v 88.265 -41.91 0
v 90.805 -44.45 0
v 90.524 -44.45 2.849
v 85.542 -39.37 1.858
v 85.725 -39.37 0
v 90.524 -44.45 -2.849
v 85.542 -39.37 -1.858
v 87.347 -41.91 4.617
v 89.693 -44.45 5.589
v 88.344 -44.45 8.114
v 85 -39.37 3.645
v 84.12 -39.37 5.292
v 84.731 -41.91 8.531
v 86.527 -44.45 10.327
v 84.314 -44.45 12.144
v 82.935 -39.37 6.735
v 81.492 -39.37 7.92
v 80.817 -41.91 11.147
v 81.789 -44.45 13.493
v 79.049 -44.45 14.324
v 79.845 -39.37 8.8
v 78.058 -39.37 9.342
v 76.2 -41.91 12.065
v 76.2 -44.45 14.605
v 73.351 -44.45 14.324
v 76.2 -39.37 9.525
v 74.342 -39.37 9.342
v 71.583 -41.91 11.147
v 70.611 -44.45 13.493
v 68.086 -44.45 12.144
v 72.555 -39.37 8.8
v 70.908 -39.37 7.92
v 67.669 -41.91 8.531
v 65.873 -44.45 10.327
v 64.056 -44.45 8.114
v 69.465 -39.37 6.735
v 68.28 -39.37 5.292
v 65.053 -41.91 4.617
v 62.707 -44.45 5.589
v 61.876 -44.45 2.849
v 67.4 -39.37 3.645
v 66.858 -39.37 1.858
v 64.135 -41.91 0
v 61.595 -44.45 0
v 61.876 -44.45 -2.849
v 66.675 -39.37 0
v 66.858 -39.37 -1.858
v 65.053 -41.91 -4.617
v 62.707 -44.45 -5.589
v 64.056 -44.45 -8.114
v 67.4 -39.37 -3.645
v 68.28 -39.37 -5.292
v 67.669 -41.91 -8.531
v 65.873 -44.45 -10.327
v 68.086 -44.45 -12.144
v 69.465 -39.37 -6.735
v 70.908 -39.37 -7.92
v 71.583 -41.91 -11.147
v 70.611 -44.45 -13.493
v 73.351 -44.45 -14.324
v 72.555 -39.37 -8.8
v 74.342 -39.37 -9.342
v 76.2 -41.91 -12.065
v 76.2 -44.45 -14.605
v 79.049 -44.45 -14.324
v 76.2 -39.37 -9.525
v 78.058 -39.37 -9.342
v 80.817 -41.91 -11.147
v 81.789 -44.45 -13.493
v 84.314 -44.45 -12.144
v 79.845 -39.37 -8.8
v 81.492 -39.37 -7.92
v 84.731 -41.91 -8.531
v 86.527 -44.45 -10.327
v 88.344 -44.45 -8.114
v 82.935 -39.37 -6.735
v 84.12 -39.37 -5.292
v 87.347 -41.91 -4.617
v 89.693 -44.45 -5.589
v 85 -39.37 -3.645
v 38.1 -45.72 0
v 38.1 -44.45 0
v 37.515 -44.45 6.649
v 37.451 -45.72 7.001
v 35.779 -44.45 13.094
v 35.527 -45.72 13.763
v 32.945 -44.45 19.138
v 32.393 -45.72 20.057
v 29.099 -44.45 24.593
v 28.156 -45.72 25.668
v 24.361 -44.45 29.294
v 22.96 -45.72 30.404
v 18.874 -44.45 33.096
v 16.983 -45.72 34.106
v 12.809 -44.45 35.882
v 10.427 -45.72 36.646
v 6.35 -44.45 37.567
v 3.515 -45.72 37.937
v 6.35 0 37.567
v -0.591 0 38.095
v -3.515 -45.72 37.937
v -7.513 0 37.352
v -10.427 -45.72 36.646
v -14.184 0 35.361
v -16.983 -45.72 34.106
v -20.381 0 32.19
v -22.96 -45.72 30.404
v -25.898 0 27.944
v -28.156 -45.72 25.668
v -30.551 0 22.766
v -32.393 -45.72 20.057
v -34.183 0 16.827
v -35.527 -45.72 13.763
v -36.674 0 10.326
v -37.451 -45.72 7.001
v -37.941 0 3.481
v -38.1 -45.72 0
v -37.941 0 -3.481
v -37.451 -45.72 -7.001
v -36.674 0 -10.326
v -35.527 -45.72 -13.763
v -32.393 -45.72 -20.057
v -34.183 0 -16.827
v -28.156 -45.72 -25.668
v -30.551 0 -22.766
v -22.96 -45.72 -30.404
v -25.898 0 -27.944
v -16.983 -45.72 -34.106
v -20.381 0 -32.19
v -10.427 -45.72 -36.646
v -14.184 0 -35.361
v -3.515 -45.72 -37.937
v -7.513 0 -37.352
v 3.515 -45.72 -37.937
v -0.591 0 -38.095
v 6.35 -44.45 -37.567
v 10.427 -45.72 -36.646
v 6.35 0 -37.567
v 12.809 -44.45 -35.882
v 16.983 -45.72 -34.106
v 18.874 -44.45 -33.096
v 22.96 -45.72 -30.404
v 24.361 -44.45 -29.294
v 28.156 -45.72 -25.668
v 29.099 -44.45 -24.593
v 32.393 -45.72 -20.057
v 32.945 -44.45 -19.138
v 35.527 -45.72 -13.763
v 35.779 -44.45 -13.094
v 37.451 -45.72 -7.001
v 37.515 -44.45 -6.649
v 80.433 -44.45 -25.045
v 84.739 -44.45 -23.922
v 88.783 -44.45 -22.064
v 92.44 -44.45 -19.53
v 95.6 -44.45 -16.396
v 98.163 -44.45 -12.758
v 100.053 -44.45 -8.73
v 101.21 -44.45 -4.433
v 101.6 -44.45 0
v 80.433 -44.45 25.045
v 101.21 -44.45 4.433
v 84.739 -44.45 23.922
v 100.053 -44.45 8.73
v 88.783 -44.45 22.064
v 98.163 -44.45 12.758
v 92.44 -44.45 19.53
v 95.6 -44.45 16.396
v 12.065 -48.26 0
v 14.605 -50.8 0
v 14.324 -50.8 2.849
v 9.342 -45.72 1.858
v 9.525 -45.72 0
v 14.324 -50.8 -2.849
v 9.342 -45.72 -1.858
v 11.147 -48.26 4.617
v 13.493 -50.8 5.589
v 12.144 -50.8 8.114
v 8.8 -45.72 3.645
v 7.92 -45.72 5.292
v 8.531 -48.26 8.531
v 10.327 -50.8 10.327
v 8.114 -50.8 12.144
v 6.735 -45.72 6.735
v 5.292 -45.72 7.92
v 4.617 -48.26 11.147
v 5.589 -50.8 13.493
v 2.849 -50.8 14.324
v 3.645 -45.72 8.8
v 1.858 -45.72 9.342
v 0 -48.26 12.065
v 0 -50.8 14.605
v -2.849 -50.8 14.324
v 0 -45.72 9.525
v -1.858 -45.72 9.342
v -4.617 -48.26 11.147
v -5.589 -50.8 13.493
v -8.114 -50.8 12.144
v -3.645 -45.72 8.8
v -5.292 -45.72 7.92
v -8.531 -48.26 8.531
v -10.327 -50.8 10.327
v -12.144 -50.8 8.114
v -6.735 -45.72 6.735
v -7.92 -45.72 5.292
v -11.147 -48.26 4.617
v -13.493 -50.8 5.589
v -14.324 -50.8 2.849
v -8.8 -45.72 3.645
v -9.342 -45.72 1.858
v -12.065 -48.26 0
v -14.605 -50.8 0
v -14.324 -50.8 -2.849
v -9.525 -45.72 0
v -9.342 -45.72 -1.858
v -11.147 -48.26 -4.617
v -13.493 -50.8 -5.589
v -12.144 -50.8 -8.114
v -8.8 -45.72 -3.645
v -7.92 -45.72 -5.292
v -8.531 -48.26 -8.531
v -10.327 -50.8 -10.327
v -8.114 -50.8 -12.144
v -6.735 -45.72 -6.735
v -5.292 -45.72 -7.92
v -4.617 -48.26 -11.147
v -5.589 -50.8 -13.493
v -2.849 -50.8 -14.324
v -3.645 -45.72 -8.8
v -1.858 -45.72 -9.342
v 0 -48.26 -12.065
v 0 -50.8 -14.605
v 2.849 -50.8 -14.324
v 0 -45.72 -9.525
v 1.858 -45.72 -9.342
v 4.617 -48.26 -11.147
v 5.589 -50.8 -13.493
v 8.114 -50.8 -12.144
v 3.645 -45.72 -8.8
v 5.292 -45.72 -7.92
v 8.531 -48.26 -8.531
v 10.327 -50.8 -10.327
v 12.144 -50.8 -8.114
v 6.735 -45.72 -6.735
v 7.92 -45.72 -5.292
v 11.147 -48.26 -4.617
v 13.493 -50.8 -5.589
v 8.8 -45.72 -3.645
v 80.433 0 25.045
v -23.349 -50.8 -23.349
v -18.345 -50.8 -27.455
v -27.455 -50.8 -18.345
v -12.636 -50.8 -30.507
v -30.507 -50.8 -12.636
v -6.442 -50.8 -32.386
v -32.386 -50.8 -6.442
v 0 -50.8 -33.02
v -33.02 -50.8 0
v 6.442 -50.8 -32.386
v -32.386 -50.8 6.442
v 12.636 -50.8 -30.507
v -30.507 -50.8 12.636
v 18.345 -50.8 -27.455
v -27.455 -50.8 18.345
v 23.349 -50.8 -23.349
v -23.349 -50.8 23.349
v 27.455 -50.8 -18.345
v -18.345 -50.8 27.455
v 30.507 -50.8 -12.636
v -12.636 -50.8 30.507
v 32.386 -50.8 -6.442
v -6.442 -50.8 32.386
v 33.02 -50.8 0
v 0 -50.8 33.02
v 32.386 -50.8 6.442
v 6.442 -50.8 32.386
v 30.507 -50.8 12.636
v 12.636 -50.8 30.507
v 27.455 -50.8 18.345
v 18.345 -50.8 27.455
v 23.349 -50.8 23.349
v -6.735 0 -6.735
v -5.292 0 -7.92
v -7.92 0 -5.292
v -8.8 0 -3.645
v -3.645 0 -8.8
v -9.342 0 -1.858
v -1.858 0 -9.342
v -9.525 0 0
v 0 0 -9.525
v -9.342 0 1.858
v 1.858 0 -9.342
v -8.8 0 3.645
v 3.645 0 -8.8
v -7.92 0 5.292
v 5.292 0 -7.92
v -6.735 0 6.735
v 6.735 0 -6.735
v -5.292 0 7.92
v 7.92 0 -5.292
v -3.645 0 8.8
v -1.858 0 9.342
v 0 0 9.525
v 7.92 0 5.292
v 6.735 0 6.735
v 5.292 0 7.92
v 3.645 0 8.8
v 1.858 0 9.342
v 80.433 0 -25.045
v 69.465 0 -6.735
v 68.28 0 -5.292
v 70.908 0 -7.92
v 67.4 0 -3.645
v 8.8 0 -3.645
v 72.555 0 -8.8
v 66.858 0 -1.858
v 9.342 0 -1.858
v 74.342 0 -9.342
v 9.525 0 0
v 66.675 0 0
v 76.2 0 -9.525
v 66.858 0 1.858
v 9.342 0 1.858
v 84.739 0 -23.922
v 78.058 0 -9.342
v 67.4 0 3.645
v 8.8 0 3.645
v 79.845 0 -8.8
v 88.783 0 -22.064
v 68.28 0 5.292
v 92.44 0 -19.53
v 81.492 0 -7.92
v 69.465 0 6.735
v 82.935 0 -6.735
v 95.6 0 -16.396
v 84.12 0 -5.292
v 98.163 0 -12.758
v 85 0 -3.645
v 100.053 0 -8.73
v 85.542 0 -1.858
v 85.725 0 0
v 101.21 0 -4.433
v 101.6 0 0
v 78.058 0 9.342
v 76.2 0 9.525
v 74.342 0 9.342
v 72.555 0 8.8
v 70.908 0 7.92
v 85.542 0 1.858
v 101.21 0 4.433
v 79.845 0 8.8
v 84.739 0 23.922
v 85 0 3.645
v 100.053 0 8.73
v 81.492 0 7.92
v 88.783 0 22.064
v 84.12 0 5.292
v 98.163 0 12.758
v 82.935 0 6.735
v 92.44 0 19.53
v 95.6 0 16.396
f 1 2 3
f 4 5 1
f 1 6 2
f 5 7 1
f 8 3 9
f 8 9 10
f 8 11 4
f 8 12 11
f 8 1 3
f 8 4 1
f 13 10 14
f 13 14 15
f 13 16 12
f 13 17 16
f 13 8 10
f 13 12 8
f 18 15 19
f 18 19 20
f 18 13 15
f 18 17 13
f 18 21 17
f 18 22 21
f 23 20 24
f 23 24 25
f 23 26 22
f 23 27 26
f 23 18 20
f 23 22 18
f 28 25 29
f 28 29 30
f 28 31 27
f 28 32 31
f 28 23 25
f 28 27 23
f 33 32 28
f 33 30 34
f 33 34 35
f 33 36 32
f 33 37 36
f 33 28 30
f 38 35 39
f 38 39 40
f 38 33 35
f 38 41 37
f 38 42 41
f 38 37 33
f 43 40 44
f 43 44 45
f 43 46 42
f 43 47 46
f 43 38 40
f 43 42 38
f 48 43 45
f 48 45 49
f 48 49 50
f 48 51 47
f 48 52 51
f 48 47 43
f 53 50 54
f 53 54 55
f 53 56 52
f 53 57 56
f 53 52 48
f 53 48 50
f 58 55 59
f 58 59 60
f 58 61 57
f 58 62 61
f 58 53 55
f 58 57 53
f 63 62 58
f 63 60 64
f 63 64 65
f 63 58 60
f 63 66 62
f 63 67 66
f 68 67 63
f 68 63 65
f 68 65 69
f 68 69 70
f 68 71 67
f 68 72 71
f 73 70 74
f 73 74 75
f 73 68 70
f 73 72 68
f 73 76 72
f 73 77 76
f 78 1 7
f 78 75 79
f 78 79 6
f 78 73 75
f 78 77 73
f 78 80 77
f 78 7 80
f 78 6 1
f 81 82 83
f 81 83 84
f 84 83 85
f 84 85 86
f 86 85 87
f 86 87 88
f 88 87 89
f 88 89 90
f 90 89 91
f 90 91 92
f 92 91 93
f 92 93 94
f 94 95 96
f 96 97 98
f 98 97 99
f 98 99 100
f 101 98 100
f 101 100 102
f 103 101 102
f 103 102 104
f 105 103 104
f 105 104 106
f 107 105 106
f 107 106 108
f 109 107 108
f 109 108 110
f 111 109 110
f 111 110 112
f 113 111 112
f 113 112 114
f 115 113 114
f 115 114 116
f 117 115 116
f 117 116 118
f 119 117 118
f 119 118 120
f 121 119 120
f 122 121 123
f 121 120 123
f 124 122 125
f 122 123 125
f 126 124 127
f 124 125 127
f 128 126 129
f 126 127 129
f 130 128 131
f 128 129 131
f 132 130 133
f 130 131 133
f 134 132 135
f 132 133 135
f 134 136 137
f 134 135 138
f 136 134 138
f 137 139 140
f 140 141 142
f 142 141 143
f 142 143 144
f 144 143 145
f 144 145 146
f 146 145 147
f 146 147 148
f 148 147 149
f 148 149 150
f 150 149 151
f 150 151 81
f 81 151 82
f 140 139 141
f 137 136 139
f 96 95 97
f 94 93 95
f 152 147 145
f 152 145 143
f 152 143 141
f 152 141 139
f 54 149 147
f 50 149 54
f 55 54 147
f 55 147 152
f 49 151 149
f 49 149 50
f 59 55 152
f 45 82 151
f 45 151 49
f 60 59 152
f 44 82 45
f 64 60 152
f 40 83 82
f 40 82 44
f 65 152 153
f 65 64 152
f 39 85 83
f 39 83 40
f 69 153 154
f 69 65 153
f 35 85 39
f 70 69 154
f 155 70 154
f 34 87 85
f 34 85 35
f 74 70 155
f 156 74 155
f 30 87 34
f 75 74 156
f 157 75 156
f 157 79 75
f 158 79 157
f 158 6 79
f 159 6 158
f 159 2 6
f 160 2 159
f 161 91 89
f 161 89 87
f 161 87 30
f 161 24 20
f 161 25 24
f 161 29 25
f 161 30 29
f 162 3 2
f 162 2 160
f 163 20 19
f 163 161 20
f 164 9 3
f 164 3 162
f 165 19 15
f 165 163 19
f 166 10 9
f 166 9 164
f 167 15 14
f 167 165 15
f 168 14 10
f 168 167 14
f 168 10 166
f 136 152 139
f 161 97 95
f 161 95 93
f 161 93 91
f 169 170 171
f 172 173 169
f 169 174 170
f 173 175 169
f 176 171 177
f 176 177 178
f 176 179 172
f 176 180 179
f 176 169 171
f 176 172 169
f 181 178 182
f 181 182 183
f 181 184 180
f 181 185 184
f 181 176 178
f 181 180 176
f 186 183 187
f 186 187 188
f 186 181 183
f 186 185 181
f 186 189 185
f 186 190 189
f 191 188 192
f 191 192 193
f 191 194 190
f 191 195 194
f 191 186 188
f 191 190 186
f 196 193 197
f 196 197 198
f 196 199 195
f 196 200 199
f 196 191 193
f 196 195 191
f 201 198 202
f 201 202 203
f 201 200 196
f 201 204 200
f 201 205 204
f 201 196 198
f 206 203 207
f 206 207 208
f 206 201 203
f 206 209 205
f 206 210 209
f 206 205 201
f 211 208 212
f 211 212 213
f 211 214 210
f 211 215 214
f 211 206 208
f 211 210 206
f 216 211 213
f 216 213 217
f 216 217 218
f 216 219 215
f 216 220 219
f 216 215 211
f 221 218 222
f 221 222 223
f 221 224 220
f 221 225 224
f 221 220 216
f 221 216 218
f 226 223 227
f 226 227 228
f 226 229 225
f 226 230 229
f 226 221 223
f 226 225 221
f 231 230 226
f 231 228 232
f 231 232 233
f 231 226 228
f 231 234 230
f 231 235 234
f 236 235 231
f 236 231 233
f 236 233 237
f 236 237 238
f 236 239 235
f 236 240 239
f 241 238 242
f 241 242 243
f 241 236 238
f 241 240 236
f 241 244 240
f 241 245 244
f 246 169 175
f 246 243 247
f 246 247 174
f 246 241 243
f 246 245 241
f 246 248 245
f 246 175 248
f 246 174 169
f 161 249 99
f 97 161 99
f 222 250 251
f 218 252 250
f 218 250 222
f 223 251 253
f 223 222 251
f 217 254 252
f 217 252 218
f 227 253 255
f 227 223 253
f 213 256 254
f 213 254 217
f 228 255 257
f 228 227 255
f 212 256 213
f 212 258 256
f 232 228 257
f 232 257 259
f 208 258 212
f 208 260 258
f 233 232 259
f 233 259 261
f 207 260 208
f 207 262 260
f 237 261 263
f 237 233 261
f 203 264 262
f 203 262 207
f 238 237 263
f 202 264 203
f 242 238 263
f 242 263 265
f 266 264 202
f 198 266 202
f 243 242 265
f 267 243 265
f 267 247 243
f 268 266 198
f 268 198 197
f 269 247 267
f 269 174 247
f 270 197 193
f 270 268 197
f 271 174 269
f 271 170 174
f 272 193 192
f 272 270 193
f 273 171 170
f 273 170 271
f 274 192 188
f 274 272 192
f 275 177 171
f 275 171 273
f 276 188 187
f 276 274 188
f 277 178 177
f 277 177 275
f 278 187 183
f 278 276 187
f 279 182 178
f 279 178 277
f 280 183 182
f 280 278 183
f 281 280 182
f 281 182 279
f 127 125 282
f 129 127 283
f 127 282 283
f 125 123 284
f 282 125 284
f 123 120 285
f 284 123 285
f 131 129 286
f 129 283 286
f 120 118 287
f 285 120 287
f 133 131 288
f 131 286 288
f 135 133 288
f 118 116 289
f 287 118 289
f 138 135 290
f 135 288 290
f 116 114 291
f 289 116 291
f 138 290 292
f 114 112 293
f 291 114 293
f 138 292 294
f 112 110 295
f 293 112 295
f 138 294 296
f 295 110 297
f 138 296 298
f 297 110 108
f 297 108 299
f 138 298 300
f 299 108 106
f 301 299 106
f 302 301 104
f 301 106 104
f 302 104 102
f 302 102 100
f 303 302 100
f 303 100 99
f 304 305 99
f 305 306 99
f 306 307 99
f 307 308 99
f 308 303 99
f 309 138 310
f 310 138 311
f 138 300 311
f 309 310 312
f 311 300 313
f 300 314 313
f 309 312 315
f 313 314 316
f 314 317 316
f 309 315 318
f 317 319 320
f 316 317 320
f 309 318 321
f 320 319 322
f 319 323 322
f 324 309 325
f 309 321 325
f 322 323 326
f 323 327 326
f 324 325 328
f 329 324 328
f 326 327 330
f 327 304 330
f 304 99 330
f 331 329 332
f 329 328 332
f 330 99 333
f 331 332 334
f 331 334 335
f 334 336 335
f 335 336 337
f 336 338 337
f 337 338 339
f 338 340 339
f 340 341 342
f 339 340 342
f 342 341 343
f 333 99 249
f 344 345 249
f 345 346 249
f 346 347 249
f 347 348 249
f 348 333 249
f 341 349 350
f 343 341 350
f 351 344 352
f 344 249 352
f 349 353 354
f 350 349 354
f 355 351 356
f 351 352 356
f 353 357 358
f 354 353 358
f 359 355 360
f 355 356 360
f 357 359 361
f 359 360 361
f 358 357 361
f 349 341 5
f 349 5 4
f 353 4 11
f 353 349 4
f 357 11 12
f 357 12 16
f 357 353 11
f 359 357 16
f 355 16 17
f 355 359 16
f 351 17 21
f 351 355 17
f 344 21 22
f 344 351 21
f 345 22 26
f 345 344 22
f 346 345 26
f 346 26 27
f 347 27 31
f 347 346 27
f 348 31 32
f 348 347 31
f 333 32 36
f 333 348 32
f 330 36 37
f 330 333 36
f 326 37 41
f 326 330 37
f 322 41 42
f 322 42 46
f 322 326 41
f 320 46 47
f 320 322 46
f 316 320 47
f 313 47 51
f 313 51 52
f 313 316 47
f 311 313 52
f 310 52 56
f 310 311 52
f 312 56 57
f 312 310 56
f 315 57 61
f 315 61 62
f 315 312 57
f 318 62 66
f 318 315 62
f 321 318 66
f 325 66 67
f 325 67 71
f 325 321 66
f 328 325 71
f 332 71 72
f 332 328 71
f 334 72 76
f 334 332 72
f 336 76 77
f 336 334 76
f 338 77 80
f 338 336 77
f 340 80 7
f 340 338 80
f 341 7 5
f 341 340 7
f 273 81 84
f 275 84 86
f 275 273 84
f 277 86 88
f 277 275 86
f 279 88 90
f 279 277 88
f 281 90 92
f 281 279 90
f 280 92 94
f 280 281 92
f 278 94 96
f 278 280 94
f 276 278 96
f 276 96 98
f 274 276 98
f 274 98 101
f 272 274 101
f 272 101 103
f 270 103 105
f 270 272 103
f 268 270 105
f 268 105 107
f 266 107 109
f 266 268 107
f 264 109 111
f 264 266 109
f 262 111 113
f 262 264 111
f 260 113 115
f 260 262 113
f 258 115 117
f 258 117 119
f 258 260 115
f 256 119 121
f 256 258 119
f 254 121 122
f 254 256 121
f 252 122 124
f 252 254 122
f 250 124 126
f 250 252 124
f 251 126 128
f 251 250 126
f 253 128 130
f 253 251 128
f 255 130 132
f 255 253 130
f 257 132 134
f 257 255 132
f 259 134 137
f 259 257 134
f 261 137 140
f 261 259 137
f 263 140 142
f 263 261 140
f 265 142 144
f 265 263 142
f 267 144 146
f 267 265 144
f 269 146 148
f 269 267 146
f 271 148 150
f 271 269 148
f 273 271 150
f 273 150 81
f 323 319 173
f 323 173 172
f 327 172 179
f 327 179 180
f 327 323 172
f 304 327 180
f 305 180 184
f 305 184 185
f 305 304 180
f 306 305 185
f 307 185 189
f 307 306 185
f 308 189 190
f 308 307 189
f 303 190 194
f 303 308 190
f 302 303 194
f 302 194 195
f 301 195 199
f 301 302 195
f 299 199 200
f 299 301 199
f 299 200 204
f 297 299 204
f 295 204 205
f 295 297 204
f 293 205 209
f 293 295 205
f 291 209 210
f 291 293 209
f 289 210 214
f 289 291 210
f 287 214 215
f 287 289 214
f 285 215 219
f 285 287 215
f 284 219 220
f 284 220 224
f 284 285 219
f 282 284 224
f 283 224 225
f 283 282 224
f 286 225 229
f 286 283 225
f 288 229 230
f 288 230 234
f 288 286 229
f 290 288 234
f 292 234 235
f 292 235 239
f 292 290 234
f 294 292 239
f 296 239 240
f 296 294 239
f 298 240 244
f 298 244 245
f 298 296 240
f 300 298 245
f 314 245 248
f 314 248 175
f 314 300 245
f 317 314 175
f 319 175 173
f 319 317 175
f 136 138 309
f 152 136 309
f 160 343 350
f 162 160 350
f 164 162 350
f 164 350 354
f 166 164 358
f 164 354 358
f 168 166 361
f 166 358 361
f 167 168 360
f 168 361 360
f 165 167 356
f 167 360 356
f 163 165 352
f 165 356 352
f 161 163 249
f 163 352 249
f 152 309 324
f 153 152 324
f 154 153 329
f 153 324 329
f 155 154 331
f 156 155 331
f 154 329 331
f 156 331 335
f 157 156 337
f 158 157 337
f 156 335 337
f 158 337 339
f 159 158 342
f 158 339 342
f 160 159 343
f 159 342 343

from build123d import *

# Parameters (mm, degrees)
F0_R     = 9.525
F1_DEPTH = 30.6987799704
F1_TAPER = 3
F2_DEPTH = 50.8
F3_DEPTH = 44.45
F4_SIZE  = 5.08


with BuildPart() as f1:
    # F0 (on Front) → F1 (new body)
    with BuildSketch(Plane.XZ):
        with BuildLine():
            ThreePointArc((6.35, -37.5671066227), (29.099355663, -24.5934442484), (38.1, 0))
            ThreePointArc((38.1, 0), (29.099355663, 24.5934442484), (6.35, 37.5671066227))
            ThreePointArc((6.35, 37.5671066227), (-38.1, 0), (6.35, -37.5671066227))
        make_face()
        Circle(F0_R, mode=Mode.SUBTRACT)
    extrude(amount=F1_DEPTH, taper=F1_TAPER)

    # F0 (on Front) → F2 (join)
    with BuildSketch(Plane.XZ):
        with BuildLine():
            ThreePointArc((6.35, -37.5671066227), (29.099355663, -24.5934442484), (38.1, 0))
            ThreePointArc((38.1, 0), (29.099355663, 24.5934442484), (6.35, 37.5671066227))
            ThreePointArc((6.35, 37.5671066227), (-38.1, 0), (6.35, -37.5671066227))
        make_face()
        Circle(F0_R, mode=Mode.SUBTRACT)
    extrude(amount=F2_DEPTH)

    # F0 (on Front) → F3 (join)
    with BuildSketch(Plane.XZ):
        with BuildLine():
            ThreePointArc((6.35, 37.5671066227), (29.099355663, 24.5934442484), (38.1, 0))
            ThreePointArc((38.1, 0), (29.099355663, -24.5934442484), (6.35, -37.5671066227))
            Line((6.35, -37.5671066227), (80.4333333333, -25.0447377485))
            ThreePointArc((80.4333333333, -25.0447377485), (50.8, 0), (80.4333333333, 25.0447377485))
            Line((80.4333333333, 25.0447377485), (6.35, 37.5671066227))
        make_face()
        with BuildLine():
            ThreePointArc((101.6, 0), (95.599570442, 16.3956294989), (80.4333333333, 25.0447377485))
            ThreePointArc((80.4333333333, 25.0447377485), (50.8, 0), (80.4333333333, -25.0447377485))
            ThreePointArc((80.4333333333, -25.0447377485), (95.599570442, -16.3956294989), (101.6, 0))
        make_face()
        with Locations((76.2, 0)):
            Circle(F0_R, mode=Mode.SUBTRACT)
    extrude(amount=F3_DEPTH)

    # F4
    f4_edges = [f1.edges().sort_by_distance(p)[0] for p in [
        (-9.525, -50.8, 0),
        (-6.35, -50.8, 37.567107),
        (66.675, -44.45, 0),
    ]]
    chamfer(f4_edges, length=F4_SIZE)


solid = f1.part
